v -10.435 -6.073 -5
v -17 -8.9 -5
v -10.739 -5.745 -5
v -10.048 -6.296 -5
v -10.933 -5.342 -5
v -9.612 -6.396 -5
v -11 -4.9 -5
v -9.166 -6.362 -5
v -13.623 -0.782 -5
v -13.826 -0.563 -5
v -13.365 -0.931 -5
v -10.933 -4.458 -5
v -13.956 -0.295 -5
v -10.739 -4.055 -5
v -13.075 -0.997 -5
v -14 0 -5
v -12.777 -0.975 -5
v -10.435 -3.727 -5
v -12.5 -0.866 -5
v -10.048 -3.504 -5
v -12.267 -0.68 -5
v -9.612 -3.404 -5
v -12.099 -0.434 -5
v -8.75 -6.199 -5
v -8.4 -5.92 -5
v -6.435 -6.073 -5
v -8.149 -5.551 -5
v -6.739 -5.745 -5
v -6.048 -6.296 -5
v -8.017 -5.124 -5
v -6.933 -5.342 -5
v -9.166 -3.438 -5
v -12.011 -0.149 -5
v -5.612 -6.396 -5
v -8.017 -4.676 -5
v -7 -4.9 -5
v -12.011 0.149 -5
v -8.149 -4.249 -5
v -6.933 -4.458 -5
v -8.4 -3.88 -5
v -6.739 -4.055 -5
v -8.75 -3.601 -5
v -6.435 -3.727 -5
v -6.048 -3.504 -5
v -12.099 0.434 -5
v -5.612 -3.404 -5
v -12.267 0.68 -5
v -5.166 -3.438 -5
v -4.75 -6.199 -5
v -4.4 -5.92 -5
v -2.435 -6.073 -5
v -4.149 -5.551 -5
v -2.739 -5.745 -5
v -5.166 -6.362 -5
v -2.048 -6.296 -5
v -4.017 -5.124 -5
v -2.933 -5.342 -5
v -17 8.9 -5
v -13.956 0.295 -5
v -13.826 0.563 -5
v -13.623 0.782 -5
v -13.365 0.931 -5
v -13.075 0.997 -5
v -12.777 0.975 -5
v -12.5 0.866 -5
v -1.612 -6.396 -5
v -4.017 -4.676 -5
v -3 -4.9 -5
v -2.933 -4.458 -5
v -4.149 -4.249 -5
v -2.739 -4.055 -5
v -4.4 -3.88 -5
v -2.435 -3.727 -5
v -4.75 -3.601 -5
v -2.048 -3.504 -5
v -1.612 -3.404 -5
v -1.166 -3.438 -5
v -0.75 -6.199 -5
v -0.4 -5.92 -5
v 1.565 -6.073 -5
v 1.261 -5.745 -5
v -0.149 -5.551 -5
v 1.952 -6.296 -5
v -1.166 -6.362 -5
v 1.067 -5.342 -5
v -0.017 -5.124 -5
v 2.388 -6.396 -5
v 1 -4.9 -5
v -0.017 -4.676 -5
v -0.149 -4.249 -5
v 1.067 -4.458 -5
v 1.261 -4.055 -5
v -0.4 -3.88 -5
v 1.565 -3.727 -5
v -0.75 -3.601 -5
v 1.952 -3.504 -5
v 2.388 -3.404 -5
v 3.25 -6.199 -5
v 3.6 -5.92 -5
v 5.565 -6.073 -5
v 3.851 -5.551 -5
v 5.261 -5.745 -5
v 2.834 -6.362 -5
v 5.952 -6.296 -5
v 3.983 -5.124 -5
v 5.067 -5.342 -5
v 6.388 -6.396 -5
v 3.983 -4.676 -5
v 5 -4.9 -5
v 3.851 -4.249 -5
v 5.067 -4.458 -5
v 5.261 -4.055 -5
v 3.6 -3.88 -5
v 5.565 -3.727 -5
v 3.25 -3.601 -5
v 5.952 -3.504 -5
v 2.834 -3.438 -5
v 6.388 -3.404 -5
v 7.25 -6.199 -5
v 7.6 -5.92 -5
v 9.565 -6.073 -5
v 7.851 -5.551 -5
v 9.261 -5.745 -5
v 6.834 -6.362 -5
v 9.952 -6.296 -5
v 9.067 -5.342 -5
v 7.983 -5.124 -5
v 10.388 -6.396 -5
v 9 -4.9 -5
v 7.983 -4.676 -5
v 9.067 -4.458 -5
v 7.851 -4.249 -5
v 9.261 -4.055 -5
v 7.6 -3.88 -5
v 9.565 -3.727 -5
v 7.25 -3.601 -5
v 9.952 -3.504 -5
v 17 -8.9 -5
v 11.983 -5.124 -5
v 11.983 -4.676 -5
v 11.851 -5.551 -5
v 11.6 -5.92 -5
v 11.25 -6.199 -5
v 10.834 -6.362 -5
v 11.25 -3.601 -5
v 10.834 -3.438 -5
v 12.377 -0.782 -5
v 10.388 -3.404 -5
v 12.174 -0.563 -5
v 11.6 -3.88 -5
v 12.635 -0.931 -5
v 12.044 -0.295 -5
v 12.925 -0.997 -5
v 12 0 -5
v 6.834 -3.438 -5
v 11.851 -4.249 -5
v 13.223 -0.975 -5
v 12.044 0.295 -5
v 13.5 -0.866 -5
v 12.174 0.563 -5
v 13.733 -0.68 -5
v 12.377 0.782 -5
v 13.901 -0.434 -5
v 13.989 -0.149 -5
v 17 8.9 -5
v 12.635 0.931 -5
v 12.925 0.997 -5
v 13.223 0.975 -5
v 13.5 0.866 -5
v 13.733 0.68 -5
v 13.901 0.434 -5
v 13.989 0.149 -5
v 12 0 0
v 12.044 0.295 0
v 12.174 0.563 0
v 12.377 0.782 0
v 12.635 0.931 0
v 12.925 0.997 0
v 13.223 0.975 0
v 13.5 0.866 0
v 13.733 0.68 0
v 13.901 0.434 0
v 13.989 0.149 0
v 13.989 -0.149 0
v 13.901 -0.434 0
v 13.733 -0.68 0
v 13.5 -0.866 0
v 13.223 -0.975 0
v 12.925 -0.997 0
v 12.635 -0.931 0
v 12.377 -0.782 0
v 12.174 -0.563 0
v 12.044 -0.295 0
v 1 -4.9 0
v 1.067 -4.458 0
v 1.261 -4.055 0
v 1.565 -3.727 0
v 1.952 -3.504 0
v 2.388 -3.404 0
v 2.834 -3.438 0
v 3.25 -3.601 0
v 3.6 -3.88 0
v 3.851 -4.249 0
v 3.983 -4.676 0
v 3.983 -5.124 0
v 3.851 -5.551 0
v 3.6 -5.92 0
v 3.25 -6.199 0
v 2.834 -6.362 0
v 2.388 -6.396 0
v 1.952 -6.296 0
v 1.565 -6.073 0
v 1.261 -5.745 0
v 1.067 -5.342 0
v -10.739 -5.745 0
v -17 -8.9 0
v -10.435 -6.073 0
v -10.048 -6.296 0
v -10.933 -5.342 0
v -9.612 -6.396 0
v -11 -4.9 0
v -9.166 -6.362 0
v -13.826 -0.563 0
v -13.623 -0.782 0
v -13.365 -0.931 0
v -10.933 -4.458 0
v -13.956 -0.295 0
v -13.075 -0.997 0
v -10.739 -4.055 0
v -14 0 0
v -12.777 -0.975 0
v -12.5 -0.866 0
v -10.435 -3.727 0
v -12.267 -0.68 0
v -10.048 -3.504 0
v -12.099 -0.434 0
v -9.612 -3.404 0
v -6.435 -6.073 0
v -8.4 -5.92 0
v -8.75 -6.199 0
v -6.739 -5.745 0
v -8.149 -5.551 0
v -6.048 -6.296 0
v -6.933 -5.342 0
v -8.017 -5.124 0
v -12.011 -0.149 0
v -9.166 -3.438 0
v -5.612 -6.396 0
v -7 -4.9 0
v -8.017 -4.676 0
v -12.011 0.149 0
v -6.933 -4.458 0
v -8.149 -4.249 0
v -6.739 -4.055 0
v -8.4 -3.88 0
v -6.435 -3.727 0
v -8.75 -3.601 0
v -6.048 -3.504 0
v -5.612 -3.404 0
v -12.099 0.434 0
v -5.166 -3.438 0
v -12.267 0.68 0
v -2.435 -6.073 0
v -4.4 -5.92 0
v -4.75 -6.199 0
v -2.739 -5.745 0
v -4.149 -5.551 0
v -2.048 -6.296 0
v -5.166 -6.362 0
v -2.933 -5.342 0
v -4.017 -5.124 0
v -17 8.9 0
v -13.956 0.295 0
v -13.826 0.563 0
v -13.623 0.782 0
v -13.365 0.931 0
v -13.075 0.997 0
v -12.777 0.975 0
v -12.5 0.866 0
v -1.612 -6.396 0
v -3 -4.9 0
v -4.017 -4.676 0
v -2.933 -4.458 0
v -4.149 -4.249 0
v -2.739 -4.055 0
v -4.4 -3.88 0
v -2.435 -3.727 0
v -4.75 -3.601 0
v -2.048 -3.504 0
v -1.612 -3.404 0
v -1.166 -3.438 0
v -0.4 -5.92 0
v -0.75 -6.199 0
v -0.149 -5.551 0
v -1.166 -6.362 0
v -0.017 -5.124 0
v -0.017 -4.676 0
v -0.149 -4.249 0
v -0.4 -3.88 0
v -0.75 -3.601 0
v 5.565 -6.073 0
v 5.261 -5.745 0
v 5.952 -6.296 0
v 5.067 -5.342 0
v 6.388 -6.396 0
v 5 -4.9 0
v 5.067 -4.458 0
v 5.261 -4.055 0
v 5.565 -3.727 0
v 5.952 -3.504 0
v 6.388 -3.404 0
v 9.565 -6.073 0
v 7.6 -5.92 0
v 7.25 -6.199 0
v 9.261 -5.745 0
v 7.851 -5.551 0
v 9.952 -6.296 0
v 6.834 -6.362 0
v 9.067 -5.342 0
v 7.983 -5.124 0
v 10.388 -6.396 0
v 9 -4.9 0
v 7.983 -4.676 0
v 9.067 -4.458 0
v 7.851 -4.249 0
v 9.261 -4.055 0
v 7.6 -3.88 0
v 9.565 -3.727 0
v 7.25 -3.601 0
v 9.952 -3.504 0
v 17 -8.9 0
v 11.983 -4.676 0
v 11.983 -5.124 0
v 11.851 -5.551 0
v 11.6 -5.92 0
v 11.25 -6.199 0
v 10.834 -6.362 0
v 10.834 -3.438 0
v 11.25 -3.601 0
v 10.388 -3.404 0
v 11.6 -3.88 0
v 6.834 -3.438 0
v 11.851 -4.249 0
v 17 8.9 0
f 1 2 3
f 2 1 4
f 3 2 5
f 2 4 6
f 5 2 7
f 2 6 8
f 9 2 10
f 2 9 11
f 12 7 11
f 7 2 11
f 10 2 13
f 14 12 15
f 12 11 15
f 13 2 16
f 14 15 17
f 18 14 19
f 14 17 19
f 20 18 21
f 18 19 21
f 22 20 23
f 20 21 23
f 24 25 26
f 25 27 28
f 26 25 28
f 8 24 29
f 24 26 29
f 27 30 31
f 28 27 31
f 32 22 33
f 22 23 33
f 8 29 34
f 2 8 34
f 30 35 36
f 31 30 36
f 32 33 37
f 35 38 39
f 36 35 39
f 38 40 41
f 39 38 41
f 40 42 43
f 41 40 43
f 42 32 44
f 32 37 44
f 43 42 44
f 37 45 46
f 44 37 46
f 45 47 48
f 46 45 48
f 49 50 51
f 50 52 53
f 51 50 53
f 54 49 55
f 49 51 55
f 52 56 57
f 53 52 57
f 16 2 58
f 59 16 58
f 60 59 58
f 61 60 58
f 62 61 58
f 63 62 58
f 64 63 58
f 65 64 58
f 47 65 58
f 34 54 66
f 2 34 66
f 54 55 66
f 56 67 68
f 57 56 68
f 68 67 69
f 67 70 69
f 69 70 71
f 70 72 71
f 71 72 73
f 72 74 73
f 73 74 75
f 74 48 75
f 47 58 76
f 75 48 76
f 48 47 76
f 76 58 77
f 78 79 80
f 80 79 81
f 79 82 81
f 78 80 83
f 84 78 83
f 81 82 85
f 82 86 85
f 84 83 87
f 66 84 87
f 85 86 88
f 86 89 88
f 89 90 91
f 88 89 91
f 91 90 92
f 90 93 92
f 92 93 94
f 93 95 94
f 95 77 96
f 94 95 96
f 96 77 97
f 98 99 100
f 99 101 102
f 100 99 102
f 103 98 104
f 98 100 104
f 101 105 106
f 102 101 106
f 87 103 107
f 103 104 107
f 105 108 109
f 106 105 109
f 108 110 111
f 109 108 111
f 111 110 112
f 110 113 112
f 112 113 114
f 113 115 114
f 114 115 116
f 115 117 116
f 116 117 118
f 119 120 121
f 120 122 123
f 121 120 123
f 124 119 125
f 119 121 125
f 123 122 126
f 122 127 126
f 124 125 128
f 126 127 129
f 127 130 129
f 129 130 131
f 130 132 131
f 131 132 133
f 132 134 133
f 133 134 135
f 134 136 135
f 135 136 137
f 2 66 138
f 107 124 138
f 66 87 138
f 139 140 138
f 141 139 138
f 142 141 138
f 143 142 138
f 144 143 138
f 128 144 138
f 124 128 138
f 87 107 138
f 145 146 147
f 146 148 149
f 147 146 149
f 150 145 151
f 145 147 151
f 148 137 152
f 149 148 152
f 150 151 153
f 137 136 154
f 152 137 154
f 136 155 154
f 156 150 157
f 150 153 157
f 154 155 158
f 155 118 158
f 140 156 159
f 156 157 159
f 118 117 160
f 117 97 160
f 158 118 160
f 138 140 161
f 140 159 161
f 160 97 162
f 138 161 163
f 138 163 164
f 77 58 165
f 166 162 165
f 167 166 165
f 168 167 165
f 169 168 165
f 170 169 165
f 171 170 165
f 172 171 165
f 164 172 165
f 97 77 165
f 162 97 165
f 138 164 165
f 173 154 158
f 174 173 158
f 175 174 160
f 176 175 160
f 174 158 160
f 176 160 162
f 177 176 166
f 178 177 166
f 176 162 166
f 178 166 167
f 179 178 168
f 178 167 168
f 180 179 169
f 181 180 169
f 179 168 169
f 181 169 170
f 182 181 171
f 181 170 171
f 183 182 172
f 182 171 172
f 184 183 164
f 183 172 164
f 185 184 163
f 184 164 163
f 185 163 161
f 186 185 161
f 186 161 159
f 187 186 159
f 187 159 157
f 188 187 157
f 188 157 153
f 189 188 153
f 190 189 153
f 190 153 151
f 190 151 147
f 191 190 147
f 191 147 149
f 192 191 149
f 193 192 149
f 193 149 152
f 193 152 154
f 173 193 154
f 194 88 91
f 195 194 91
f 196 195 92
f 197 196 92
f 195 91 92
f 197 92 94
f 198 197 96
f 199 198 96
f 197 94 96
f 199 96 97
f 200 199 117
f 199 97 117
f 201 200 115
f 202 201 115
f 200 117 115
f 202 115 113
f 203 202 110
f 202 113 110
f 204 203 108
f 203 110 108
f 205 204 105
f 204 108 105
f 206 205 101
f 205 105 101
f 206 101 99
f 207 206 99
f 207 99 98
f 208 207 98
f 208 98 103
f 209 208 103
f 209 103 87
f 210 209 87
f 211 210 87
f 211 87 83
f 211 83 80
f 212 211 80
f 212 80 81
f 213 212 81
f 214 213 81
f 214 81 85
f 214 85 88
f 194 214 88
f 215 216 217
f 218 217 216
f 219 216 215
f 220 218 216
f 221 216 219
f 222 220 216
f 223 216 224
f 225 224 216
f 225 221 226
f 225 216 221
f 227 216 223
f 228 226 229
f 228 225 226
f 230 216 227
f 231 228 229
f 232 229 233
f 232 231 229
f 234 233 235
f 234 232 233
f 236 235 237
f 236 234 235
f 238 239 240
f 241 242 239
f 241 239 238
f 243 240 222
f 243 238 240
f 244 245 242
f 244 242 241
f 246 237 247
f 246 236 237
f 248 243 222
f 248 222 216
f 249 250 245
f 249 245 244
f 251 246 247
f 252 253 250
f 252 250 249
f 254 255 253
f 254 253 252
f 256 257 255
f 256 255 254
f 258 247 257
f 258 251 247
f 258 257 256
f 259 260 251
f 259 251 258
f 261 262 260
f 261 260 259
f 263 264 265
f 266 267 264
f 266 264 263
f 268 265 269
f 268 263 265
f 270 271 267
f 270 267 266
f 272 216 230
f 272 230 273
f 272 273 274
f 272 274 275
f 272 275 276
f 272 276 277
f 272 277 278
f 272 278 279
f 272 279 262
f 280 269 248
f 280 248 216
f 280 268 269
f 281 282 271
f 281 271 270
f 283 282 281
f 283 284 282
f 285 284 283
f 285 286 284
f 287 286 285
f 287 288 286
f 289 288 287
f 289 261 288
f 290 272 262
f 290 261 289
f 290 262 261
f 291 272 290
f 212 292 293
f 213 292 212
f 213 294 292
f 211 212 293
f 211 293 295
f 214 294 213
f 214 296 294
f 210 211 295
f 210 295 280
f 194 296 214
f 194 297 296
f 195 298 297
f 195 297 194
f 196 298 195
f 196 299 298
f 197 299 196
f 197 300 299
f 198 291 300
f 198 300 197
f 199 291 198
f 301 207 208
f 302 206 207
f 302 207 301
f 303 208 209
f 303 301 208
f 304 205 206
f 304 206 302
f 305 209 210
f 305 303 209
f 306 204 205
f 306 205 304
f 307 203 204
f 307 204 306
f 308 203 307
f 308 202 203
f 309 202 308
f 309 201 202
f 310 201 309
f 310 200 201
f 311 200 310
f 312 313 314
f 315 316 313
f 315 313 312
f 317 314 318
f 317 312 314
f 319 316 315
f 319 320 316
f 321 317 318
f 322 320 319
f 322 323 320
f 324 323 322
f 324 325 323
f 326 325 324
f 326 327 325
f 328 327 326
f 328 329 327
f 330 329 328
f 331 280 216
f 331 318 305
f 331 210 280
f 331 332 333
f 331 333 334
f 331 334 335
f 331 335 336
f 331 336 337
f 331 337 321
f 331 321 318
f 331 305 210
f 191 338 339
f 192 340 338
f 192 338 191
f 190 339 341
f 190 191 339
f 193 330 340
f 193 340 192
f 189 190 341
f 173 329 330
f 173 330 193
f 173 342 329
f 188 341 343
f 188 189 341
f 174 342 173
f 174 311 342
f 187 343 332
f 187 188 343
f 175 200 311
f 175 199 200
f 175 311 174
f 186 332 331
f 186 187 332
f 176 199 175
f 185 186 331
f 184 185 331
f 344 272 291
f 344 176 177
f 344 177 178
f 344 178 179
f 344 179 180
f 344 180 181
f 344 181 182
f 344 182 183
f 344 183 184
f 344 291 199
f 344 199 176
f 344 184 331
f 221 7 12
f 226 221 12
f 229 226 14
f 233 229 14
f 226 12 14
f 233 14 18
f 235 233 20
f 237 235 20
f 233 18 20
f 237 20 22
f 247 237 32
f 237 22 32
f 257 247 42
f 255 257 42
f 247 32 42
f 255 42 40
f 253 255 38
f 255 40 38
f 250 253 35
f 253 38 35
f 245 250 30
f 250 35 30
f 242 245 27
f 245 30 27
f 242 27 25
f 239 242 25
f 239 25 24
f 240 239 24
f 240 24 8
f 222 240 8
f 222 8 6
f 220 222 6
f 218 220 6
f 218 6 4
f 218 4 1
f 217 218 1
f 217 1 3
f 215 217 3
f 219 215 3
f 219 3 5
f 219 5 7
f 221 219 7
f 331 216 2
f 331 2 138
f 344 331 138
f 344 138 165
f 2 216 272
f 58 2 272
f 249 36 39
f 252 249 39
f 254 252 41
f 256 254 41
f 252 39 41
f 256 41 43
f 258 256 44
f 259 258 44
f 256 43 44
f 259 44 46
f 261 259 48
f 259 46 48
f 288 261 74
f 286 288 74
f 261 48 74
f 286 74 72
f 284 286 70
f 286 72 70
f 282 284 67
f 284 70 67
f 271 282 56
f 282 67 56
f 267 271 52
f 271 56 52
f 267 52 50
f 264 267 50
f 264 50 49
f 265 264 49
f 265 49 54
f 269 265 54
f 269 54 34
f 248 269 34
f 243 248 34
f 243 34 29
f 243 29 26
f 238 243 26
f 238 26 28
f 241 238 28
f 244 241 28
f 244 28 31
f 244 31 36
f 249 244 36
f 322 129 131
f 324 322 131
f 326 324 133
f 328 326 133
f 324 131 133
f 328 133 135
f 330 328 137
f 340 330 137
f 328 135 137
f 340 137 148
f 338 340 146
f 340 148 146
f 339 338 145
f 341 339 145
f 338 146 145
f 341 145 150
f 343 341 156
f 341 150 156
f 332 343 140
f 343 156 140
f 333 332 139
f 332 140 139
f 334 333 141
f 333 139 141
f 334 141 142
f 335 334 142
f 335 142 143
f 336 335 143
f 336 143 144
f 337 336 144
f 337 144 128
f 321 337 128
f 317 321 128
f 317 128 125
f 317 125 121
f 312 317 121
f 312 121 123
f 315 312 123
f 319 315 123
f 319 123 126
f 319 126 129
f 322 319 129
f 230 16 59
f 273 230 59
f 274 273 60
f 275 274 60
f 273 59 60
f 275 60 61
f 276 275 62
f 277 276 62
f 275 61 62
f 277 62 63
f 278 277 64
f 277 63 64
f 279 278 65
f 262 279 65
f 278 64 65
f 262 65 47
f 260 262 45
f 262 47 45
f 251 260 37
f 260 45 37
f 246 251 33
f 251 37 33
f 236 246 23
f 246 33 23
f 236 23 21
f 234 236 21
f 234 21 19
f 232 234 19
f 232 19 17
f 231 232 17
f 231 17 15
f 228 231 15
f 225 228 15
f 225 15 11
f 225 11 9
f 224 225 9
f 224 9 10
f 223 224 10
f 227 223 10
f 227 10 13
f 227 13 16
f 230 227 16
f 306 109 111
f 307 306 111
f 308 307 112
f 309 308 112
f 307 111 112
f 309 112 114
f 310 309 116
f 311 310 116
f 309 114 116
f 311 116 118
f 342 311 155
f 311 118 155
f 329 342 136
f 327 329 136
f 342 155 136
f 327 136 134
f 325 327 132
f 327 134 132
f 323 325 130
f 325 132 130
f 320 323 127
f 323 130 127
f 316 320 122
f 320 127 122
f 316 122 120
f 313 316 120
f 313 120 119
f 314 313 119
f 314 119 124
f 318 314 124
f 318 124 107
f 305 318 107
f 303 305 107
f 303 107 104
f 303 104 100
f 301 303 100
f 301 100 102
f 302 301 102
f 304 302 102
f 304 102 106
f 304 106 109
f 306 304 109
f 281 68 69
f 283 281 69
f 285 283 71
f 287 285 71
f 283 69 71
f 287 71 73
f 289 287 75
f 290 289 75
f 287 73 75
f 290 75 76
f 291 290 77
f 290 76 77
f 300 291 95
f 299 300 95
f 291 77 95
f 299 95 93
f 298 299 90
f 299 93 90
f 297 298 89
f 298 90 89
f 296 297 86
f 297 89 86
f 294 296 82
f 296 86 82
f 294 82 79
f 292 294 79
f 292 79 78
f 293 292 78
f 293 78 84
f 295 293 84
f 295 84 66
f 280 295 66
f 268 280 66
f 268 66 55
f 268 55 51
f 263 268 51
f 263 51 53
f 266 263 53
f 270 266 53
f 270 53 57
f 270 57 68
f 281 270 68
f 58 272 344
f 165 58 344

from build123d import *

# Parameters (mm, degrees)
F0_W     = 34
F0_H     = 17.8
F1_DEPTH = 5
F3_D     = 2
F5_D     = 2
F7_D     = 3


with BuildPart() as f1:
    # F0 (on Top) → F1 (new body)
    with BuildSketch(Plane.XY):
        Rectangle(F0_W, F0_H)
    extrude(amount=-F1_DEPTH)

    # F3 (through all)
    with Locations(Plane.XY):
        with Locations((-13, 0)):
            Hole(F3_D / 2)

    # F5 (through all)
    with Locations(Plane.XY):
        with Locations((13, 0)):
            Hole(F5_D / 2)

    # F7 (through all)
    with Locations(Plane.XY):
        with Locations((-9.5, -4.9), (-5.5, -4.9), (-1.5, -4.9), (2.5, -4.9), (6.5, -4.9), (10.5, -4.9)):
            Hole(F7_D / 2)


solid = f1.part
